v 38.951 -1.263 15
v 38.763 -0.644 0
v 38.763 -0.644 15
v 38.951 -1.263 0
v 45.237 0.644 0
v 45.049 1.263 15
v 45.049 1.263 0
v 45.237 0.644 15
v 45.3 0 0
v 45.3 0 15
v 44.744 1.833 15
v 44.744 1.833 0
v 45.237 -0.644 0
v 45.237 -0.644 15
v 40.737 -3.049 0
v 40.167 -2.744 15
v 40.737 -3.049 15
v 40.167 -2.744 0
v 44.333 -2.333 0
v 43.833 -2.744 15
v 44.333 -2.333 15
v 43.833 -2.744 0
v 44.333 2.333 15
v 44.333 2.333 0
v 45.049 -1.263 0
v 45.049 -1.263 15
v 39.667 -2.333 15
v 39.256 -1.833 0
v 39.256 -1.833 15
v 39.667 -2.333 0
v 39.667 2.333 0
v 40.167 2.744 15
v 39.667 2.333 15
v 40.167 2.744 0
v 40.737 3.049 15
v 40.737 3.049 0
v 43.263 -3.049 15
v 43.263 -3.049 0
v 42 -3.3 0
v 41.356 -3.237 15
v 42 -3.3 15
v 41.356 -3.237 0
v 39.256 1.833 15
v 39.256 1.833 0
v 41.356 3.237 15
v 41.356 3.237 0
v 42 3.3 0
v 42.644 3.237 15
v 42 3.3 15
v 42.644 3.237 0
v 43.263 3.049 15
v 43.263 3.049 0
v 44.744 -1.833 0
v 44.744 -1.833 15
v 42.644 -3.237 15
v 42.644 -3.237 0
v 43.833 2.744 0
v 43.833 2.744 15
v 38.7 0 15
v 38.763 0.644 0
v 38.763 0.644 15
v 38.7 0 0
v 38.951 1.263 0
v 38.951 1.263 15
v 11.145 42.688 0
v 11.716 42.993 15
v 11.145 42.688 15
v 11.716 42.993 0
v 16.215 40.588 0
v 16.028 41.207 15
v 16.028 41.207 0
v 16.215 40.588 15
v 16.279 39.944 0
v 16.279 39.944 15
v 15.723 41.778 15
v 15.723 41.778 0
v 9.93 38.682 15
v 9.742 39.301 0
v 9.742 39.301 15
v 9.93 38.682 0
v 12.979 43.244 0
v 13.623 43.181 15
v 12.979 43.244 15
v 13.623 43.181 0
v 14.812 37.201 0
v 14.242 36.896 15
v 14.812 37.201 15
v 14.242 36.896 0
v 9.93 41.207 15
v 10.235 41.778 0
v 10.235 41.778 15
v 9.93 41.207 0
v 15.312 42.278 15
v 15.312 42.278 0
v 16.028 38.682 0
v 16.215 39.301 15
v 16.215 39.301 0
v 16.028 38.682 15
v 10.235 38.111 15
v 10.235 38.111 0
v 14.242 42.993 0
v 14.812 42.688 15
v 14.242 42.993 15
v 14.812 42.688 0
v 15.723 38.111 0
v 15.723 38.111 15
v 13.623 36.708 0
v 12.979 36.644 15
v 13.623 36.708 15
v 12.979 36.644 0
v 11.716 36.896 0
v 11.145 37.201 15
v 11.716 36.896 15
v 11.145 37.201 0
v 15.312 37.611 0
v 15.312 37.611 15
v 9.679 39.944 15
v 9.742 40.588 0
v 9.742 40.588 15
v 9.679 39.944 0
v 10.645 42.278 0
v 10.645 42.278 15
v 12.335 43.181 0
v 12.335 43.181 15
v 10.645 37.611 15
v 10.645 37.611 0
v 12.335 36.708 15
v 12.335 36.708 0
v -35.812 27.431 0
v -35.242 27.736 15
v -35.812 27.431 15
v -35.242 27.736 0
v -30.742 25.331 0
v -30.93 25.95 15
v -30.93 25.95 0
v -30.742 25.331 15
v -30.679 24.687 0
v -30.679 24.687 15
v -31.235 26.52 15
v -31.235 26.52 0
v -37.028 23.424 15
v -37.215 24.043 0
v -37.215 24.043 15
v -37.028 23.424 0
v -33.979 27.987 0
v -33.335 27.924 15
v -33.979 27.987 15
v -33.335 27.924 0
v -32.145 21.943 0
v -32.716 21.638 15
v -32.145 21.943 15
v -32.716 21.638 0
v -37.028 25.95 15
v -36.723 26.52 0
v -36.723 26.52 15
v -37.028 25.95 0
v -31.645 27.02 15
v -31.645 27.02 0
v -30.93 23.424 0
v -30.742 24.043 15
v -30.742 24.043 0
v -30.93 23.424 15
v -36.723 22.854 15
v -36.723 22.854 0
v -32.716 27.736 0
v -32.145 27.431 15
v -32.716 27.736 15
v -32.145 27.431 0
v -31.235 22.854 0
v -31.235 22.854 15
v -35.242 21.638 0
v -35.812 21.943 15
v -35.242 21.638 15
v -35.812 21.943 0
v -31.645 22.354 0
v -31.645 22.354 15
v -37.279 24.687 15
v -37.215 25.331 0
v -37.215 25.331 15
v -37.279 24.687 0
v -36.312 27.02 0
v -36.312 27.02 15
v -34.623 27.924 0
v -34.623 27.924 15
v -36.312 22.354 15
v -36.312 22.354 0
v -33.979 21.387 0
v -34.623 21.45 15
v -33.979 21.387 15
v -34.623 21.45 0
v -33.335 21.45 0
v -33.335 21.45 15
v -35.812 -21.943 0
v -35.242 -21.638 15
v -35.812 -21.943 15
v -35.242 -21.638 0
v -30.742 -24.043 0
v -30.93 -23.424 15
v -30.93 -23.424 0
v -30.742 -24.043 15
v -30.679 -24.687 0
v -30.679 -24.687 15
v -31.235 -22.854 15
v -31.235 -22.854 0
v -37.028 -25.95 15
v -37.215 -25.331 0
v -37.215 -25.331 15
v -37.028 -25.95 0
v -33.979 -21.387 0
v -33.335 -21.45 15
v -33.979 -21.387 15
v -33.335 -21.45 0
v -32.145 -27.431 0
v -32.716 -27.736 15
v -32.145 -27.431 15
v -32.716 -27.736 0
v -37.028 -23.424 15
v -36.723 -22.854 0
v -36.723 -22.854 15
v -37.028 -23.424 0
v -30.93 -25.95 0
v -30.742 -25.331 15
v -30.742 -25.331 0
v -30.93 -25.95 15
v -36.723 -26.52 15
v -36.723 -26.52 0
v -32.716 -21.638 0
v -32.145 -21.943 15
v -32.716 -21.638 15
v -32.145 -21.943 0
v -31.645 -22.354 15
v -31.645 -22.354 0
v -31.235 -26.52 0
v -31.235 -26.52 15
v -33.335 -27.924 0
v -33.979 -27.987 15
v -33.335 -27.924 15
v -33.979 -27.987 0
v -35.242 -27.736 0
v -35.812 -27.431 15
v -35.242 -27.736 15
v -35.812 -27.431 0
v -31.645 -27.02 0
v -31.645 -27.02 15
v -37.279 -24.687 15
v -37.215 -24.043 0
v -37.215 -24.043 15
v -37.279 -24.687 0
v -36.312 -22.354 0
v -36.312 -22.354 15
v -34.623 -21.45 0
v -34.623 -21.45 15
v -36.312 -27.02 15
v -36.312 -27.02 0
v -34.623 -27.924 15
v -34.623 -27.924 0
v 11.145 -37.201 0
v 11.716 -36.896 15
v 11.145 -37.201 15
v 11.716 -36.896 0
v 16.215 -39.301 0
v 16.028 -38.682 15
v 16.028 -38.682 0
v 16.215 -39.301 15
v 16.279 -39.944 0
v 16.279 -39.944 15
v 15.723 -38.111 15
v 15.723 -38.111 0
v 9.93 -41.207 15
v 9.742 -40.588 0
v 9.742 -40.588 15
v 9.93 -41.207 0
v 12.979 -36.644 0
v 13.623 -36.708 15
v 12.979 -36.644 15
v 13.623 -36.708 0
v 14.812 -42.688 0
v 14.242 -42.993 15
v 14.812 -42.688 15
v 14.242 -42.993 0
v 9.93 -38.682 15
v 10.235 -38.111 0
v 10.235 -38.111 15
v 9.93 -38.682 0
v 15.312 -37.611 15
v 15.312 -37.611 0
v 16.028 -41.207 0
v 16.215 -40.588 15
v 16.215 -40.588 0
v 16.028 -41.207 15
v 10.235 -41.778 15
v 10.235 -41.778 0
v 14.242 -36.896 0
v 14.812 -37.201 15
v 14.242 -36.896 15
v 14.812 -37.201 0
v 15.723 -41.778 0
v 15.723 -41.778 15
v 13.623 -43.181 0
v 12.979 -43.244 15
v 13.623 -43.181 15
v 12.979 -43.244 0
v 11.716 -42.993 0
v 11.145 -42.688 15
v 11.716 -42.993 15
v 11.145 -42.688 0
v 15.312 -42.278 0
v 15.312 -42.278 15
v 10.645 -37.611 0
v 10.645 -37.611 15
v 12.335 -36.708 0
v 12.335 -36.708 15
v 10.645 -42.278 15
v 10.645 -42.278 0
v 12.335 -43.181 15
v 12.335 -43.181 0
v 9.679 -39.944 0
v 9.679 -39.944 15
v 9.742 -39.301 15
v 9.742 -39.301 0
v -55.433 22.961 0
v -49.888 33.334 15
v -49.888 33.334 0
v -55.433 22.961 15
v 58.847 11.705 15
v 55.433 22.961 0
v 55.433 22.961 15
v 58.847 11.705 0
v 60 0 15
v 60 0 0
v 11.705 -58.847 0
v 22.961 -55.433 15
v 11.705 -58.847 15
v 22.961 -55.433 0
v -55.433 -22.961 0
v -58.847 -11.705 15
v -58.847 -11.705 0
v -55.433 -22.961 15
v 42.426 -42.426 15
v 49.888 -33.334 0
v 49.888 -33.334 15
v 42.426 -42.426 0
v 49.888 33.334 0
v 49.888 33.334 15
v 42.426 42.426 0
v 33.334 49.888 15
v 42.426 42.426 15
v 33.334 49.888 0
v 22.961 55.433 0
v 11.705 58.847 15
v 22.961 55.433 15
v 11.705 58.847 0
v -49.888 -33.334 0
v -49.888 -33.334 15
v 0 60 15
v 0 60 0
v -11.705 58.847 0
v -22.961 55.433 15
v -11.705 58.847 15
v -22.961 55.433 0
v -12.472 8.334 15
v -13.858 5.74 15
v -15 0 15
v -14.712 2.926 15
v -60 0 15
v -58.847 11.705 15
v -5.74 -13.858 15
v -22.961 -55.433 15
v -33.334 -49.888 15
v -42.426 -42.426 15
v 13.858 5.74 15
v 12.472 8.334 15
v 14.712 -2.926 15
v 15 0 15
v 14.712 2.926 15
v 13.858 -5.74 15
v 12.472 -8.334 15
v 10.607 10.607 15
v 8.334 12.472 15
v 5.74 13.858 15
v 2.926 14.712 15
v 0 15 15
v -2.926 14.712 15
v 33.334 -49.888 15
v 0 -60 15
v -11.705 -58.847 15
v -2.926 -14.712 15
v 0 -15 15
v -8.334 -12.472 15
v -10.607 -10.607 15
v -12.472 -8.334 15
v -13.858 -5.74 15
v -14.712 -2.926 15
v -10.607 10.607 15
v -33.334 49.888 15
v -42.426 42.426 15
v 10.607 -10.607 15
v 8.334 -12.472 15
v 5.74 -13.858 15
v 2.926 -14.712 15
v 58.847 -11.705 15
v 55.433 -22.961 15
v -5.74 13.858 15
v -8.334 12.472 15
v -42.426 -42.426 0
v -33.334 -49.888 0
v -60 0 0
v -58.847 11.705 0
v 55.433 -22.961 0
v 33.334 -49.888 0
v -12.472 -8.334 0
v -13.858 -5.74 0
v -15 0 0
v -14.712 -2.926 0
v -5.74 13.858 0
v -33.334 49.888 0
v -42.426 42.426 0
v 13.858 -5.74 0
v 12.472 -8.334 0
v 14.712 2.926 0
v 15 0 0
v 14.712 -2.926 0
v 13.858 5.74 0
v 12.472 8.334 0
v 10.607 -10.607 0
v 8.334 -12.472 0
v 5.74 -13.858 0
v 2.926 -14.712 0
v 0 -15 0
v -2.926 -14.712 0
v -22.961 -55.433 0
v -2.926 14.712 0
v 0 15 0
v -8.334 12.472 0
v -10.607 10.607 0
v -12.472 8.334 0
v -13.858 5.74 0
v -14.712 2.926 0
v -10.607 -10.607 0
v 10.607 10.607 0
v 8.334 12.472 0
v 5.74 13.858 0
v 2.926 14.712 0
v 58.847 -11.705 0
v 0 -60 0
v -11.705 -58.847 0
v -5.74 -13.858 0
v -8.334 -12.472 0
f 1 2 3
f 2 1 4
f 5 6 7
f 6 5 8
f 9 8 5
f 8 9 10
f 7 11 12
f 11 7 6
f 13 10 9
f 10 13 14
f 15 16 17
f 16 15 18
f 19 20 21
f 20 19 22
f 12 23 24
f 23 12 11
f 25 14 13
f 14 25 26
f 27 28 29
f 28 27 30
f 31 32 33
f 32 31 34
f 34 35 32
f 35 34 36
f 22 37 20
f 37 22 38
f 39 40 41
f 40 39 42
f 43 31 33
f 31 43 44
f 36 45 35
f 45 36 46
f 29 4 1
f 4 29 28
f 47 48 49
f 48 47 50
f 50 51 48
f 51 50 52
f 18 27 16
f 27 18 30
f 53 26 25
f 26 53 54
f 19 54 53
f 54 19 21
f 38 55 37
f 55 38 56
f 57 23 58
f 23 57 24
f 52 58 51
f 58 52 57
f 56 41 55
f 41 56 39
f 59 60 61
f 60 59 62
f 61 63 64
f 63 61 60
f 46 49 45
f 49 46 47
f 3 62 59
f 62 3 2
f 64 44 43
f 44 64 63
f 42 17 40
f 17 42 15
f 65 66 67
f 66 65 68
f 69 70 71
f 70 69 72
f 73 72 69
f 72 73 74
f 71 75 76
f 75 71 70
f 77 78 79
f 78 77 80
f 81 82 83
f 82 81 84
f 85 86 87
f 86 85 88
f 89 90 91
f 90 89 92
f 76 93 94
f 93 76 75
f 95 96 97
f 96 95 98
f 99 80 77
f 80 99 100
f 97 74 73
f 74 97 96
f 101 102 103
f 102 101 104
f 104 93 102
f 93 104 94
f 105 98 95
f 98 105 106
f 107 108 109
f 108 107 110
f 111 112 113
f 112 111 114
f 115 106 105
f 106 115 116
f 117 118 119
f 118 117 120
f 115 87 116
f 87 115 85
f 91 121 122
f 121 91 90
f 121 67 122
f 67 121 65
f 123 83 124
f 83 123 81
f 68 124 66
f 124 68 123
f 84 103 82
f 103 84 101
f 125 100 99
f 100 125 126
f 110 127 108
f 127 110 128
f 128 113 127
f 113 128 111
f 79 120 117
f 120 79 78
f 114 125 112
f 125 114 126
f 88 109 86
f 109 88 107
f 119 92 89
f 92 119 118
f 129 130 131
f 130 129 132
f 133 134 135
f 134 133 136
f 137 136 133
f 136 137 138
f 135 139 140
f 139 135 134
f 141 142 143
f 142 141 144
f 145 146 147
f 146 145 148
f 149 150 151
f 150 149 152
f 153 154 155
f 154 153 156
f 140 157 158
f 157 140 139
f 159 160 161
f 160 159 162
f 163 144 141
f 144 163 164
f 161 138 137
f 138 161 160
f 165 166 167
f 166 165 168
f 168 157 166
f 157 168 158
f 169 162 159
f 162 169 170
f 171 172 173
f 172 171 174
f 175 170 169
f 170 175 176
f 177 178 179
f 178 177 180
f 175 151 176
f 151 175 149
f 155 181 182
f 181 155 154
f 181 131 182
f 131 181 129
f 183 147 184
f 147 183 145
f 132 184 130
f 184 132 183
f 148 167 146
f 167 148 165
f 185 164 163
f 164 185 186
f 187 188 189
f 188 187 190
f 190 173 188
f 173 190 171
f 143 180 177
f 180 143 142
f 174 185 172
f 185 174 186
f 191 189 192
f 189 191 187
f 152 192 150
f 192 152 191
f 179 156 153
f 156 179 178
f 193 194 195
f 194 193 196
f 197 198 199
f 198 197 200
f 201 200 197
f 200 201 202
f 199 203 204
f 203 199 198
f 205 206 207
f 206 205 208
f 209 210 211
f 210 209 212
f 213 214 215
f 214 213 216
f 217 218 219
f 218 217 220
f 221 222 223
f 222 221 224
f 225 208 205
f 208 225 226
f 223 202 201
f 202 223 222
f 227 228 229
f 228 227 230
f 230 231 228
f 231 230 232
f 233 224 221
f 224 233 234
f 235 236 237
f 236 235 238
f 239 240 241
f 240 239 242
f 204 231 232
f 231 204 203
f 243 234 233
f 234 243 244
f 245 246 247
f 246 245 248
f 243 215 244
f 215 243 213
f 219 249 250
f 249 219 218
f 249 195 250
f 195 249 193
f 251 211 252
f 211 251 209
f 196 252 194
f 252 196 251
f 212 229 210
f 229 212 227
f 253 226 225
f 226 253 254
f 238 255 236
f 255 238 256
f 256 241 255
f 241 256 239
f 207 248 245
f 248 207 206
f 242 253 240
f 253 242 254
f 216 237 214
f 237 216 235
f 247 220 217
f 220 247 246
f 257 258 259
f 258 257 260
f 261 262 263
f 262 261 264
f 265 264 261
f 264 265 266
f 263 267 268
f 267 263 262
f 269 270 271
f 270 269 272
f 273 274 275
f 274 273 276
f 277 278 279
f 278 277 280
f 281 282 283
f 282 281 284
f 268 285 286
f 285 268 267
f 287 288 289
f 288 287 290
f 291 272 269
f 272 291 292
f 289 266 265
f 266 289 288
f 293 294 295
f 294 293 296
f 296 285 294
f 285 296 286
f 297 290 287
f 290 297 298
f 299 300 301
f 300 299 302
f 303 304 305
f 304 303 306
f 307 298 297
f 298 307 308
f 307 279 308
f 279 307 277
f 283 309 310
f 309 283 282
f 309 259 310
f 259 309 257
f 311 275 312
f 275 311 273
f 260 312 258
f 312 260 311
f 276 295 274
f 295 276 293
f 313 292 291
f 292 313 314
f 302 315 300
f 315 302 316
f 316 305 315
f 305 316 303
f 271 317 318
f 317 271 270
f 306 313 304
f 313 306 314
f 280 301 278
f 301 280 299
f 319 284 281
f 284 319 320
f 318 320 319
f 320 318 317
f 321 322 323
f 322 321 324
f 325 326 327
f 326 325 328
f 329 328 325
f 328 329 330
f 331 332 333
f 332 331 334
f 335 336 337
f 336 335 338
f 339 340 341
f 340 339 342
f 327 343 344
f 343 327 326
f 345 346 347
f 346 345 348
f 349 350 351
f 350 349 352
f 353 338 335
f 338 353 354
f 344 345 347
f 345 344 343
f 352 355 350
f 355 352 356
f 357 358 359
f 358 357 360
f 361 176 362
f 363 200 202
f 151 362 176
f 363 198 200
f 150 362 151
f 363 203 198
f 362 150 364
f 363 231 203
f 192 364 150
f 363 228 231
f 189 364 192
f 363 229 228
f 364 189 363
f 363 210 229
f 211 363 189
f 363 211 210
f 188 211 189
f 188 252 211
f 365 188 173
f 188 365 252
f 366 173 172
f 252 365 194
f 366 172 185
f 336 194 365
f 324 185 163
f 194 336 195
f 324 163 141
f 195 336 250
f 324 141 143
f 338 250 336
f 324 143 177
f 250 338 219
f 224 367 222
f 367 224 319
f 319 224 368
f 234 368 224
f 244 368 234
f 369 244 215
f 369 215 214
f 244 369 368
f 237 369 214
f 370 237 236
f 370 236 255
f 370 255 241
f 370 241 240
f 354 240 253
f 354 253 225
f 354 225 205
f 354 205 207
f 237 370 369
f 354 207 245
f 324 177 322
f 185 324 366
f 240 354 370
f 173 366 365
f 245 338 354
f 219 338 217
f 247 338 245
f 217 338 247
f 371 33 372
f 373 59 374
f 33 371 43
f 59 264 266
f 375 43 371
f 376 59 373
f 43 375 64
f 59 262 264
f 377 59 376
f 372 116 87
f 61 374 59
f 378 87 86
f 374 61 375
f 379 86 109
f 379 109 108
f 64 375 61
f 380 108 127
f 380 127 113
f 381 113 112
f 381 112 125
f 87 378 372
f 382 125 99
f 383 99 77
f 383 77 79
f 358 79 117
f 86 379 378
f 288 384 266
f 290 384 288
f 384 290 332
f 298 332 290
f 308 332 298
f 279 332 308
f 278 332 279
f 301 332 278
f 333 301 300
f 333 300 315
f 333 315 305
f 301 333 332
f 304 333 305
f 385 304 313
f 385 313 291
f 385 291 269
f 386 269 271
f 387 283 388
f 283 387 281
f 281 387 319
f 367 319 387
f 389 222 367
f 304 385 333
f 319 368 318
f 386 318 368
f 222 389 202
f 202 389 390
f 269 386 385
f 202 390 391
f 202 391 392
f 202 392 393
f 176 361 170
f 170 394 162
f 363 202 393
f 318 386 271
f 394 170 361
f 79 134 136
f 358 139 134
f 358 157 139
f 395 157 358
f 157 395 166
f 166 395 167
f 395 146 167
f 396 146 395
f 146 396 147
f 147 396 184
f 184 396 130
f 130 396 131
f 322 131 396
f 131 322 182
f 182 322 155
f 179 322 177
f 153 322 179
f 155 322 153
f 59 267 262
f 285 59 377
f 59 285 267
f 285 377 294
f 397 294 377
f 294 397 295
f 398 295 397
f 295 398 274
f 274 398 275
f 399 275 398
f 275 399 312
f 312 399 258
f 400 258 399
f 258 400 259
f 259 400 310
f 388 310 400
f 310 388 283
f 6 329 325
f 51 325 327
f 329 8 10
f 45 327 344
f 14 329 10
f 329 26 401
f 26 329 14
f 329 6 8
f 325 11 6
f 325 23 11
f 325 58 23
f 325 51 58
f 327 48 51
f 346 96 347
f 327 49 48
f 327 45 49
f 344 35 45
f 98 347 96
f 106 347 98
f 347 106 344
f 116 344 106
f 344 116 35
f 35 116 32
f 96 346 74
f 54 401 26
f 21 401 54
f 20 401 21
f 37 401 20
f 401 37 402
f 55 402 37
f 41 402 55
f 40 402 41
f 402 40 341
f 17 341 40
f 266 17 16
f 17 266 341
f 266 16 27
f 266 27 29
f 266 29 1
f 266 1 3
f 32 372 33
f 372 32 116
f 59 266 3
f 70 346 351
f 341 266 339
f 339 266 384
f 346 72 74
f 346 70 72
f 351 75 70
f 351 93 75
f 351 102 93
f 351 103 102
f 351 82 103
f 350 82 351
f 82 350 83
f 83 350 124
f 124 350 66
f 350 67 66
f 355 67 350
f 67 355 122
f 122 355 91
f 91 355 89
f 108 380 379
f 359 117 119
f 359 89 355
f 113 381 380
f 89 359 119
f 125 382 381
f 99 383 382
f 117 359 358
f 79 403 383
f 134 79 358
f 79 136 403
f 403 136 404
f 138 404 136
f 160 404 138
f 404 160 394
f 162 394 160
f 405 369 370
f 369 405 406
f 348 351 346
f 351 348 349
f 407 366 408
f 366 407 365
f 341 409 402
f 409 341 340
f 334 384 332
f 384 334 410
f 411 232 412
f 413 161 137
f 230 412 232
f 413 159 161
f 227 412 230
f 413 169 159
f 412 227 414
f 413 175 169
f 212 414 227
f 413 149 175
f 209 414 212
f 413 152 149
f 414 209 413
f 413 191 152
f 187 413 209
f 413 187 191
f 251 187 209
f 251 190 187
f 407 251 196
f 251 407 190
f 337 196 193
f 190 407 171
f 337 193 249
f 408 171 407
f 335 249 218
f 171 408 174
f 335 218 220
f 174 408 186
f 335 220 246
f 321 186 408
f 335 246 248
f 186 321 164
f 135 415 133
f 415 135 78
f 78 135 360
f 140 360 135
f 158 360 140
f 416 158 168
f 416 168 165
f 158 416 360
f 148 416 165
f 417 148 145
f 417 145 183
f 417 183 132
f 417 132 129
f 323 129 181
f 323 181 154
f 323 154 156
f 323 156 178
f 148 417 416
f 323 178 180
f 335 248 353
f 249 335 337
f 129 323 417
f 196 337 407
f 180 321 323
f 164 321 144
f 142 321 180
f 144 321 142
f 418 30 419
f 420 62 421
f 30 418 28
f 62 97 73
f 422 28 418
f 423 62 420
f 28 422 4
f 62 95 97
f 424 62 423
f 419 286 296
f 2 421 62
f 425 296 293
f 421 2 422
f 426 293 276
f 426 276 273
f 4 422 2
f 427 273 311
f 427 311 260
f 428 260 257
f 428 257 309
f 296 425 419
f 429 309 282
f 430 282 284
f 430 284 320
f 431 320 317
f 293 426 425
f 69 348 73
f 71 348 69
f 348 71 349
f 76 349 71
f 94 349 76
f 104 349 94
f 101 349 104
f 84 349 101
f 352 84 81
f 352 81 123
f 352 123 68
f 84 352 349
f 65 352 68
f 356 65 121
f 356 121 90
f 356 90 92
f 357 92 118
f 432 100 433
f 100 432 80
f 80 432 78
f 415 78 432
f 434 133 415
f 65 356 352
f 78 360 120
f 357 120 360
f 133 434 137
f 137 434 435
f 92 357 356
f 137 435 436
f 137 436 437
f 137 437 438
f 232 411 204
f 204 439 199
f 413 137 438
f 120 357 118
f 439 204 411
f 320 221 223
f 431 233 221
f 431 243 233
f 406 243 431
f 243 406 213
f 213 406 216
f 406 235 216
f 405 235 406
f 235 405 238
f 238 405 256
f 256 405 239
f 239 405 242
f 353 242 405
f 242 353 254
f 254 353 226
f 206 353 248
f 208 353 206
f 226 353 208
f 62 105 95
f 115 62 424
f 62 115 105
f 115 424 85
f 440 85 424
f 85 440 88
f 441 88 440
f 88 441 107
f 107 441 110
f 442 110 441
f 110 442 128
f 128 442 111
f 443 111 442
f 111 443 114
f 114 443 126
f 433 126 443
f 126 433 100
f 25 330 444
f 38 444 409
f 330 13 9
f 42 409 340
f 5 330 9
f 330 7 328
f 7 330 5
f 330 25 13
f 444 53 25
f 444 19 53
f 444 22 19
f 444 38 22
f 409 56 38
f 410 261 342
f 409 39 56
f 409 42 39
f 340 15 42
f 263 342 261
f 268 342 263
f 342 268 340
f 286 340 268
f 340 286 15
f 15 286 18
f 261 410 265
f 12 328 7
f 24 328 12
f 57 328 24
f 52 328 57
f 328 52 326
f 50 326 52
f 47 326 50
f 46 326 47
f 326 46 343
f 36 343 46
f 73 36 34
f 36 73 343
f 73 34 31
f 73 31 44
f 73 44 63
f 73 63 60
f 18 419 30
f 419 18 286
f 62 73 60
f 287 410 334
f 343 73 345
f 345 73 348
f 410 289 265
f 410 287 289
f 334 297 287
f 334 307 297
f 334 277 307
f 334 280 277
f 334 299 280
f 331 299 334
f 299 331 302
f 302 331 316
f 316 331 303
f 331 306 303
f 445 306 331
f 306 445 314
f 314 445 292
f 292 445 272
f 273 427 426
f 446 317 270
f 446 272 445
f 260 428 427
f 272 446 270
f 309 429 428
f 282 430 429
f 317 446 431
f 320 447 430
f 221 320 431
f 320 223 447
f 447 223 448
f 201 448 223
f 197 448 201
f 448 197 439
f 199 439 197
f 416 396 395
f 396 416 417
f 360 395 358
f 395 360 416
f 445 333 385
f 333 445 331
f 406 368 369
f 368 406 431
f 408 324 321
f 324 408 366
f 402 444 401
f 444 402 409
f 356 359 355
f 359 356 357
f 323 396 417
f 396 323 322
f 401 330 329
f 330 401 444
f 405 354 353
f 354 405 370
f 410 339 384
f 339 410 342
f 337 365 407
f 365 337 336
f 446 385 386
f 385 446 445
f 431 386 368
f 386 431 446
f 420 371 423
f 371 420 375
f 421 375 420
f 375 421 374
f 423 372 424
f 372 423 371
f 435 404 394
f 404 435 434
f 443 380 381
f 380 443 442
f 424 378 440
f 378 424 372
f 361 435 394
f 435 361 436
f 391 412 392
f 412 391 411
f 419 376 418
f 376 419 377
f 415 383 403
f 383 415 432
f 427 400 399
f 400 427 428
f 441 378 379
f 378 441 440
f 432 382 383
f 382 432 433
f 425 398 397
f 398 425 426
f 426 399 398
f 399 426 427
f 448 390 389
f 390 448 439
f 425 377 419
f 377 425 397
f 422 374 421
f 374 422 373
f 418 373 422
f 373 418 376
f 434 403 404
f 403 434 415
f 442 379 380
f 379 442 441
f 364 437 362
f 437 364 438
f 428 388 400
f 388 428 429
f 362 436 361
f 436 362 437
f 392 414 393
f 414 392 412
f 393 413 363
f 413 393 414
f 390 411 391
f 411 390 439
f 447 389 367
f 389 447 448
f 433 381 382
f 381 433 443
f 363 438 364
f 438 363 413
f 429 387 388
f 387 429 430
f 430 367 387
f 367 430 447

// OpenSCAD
$fn = 32;

// ----------------------------------------------------------------------
// Flange Ø120 x 15
// 5 holes on a Ø84 bolt circle, bolted joints
// ----------------------------------------------------------------------

// --- parameters (mm) ---
flange_d = 120;  // outside diameter of the flange
thickness = 15;  // flange thickness
holes = 5;       // number of bolt holes
pcd = 84;        // bolt circle diameter
start_deg = 0;   // angle of the first hole, from +X
hole_d = 6.6;    // bolt hole diameter
bore_d = 30;     // central through bore
hub_d = 38;      // hub outside diameter
hub_h = 0;       // hub height above the flange face (0 = no hub)

// --- derived feature positions (mm) ---
height = thickness + hub_h;  // = 15   overall height of the part
pcd_r = pcd / 2;             // = 42   bolt circle radius
hole_step = 360 / holes;     // = 72   angular pitch
feature_centers = [
  [pcd_r * cos(start_deg + 0 * hole_step), pcd_r * sin(start_deg + 0 * hole_step)],
  [pcd_r * cos(start_deg + 1 * hole_step), pcd_r * sin(start_deg + 1 * hole_step)],
  [pcd_r * cos(start_deg + 2 * hole_step), pcd_r * sin(start_deg + 2 * hole_step)],
  [pcd_r * cos(start_deg + 3 * hole_step), pcd_r * sin(start_deg + 3 * hole_step)],
  [pcd_r * cos(start_deg + 4 * hole_step), pcd_r * sin(start_deg + 4 * hole_step)]
];   // bolt hole centres on the pitch circle

// flange disc, every hole and the bore cut straight through
difference() {
  union() {
    cylinder(d = flange_d, h = thickness);
  }
  translate([0, 0, -1]) cylinder(d = bore_d, h = height + 2);  // bore, through
  for (centre = feature_centers)
    translate([centre[0], centre[1], -1]) cylinder(d = hole_d, h = thickness + 2);
}
